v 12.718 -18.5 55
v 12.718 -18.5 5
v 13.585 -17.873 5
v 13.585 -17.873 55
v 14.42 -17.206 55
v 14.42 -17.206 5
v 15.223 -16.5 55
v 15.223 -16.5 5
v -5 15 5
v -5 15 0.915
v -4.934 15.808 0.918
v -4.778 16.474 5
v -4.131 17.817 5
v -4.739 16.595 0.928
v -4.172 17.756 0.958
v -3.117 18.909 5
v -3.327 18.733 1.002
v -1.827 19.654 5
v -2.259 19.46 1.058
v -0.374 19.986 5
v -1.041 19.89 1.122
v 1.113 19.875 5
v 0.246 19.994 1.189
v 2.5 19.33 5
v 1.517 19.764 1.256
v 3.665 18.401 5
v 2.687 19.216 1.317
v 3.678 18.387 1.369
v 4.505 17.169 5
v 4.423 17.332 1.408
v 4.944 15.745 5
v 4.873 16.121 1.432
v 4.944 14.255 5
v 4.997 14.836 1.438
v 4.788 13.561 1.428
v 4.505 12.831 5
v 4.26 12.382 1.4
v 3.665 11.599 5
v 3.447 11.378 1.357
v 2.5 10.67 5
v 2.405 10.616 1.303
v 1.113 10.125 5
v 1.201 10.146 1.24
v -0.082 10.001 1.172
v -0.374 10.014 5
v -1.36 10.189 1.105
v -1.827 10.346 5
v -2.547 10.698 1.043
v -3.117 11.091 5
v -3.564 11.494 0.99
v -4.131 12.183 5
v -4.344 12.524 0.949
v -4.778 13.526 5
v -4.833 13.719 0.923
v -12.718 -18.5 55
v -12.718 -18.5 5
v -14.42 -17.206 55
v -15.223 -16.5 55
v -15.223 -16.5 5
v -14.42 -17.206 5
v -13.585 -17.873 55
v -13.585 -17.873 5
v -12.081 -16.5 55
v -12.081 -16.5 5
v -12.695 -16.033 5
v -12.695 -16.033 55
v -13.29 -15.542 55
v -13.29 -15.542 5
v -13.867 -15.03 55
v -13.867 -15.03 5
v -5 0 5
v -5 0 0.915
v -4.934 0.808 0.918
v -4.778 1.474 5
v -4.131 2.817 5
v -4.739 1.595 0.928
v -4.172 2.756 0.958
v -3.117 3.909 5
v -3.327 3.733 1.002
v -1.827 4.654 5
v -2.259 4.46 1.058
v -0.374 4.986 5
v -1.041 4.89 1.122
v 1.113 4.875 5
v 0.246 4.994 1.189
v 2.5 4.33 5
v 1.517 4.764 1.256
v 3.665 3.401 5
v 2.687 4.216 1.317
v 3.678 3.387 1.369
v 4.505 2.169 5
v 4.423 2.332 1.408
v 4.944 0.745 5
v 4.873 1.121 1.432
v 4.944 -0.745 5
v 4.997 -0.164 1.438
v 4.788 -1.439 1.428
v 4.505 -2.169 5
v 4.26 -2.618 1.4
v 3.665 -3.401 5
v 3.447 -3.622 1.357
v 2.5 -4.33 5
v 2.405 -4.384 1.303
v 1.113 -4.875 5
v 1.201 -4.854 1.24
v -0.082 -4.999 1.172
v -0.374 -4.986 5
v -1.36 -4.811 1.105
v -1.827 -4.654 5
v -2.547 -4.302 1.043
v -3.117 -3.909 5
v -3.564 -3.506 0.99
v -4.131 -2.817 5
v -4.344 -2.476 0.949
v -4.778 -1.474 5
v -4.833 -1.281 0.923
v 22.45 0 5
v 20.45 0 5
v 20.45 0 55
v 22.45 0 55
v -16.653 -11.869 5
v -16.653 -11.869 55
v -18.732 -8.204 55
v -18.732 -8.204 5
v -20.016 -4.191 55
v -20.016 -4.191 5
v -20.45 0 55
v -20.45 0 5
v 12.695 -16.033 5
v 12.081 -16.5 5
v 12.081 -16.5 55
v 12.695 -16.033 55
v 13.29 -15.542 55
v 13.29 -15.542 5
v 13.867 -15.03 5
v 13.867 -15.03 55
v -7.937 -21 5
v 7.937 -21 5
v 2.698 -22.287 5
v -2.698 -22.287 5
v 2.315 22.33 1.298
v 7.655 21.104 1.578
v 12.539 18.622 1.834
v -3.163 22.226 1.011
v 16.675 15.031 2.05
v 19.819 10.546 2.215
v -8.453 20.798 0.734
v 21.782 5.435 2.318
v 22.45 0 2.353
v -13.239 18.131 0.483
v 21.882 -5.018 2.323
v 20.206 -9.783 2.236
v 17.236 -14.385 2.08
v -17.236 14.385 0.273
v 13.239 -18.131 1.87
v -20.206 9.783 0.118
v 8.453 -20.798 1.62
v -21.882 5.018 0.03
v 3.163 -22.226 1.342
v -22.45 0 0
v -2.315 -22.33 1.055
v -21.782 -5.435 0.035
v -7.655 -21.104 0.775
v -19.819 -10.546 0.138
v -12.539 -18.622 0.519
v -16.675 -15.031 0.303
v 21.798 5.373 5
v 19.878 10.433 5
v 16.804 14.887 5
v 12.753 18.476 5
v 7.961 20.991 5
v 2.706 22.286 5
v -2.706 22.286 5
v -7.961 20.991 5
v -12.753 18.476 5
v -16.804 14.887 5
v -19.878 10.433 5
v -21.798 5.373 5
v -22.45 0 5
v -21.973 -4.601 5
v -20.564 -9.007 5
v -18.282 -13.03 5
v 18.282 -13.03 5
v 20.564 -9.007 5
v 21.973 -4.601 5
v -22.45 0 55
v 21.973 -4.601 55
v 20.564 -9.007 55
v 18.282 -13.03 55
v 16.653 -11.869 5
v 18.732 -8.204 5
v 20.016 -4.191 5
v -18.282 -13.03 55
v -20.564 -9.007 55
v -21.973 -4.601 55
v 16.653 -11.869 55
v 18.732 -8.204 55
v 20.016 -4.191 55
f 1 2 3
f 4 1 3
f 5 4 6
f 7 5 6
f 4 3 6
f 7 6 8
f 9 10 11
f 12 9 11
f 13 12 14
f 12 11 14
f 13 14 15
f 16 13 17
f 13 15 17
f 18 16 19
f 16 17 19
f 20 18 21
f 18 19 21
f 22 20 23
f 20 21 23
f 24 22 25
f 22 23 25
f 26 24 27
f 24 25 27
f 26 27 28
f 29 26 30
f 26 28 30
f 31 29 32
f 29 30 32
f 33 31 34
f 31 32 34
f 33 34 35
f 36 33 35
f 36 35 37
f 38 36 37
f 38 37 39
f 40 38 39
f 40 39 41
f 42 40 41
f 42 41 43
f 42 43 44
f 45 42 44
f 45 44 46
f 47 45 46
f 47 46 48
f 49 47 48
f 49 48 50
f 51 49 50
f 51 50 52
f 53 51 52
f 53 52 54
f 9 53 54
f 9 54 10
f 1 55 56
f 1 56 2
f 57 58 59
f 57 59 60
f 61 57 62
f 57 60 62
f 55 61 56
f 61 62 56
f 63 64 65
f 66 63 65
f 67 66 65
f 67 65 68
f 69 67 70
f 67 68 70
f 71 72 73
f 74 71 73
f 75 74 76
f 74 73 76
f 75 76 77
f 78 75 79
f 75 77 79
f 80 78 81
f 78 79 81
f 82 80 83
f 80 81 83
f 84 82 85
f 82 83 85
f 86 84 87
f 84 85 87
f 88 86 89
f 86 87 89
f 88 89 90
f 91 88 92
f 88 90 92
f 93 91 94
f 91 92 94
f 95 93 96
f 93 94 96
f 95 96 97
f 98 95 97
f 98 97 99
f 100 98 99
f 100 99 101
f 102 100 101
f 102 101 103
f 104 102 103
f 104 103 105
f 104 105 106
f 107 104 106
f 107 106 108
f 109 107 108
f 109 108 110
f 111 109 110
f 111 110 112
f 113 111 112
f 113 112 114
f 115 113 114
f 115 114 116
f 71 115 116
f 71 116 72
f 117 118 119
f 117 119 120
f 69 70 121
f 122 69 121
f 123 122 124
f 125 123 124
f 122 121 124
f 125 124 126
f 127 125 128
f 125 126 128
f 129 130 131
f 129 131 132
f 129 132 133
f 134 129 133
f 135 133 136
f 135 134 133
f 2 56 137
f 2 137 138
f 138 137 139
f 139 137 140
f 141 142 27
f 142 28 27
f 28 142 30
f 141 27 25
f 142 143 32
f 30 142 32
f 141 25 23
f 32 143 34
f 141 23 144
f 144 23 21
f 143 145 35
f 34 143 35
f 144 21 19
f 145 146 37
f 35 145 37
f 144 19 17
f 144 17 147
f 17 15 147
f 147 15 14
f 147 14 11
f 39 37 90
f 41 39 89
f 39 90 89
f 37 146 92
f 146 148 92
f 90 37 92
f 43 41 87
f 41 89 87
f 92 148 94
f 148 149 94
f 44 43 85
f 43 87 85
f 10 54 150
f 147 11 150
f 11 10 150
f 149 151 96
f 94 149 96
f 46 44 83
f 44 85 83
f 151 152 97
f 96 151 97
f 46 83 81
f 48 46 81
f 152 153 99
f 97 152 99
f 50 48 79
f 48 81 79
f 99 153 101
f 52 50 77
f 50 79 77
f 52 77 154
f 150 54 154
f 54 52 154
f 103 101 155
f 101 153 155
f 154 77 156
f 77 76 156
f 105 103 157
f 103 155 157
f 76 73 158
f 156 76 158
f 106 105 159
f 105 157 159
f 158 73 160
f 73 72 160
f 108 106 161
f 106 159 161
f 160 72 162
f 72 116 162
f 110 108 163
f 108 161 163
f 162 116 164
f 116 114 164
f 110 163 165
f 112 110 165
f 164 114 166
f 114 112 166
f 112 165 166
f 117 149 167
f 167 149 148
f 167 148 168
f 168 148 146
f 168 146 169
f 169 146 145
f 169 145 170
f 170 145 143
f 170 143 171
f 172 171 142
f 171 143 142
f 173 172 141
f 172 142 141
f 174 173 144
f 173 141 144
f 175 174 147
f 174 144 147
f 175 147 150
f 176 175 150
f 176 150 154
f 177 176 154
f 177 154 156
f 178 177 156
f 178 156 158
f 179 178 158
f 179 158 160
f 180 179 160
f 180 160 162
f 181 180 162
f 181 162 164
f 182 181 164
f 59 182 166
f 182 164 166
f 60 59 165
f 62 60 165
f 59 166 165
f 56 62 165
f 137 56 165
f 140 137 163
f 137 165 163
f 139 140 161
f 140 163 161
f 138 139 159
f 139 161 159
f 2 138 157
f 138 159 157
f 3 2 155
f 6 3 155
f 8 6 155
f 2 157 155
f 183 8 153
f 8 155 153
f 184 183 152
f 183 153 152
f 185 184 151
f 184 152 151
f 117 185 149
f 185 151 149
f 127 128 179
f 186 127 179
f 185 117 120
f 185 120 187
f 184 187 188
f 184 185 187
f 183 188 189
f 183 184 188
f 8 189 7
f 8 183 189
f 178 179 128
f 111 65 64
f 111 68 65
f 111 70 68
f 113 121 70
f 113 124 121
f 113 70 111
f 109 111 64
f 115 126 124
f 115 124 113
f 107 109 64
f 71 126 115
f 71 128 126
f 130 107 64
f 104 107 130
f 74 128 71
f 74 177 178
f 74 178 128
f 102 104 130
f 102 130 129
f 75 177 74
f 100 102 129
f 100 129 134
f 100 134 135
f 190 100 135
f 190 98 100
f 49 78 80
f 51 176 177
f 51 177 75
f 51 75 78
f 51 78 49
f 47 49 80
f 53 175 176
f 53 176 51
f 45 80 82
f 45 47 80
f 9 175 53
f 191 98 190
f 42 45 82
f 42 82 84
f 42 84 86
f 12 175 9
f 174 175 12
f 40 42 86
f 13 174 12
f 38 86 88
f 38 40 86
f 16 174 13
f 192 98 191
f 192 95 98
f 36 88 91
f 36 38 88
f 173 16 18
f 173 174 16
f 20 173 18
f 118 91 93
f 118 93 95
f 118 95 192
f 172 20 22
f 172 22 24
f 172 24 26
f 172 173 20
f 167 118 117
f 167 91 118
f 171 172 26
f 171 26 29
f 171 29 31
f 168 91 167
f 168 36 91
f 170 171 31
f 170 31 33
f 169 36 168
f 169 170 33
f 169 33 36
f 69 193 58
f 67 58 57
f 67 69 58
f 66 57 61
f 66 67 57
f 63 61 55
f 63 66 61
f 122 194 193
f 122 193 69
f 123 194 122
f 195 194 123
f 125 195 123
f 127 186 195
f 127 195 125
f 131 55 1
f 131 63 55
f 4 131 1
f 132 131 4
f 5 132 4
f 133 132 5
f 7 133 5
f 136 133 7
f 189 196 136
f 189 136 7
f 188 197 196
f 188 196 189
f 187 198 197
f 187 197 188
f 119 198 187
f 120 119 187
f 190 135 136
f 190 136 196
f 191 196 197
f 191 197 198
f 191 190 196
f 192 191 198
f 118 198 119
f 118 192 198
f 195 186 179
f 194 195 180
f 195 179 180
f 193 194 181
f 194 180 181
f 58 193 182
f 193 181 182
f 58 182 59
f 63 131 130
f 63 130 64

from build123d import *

# Parameters (mm, degrees)
SKETCH1_R               = 22.45
BOSS_EXTRUDE1_DEPTH     = 5
SKETCH2_R               = 5
CUT_EXTRUDE1_DEPTH      = 5
BOSS_EXTRUDE2_DEPTH     = 50
BOSS_EXTRUDE5_DEPTH     = 50
CUT_EXTRUDE3_DEPTH      = 64.505944604
CUT_EXTRUDE3_DEPTH_BACK = 64.505944604


with BuildPart() as part:
    # Sketch1 → Boss-Extrude1 (new body)
    with BuildSketch(Plane.XY):
        Circle(SKETCH1_R)
    extrude(amount=BOSS_EXTRUDE1_DEPTH)

    # Sketch2 → Cut-Extrude1 (cut)
    with BuildSketch(Plane(origin=(0, 0, 0), x_dir=(-1, 0, 0), z_dir=(0, 0, -1))):
        Circle(SKETCH2_R)
        with Locations((0, 15)):
            Circle(SKETCH2_R)
    extrude(amount=-CUT_EXTRUDE1_DEPTH, mode=Mode.SUBTRACT)

    # Sketch3 → Boss-Extrude2 (add)
    with BuildSketch(Plane.XY.offset(5)):
        with BuildLine():
            Line((-12.718195627, -18.5), (12.718195627, -18.5))
            ThreePointArc((12.718195627, -18.5), (14.006550731, -17.544772344), (15.223419458, -16.5))
            Line((15.223419458, -16.5), (-15.223419458, -16.5))
            ThreePointArc((-15.223419458, -16.5), (-14.006550731, -17.544772344), (-12.718195627, -18.5))
        make_face()
    extrude(amount=BOSS_EXTRUDE2_DEPTH)

    # Sketch5 → Boss-Extrude5 (add)
    with BuildSketch(Plane.XY.offset(5)):
        with BuildLine():
            Line((-15.223419458, -16.5), (-12.08108025, -16.5))
            ThreePointArc((-12.08108025, -16.5), (-12.994947259, -15.790308602), (-13.867212825, -15.030066815))
            ThreePointArc((-13.867212825, -15.030066815), (-18.732151535, -8.204206169), (-20.45, 0))
            Line((-20.45, 0), (-22.45, 0))
            ThreePointArc((-22.45, 0), (-20.564146795, -9.006573521), (-15.223419458, -16.5))
        make_face()
        with BuildLine():
            Line((20.45, 0), (22.45, 0))
            ThreePointArc((22.45, 0), (20.564146795, -9.006573521), (15.223419458, -16.5))
            Line((15.223419458, -16.5), (12.08108025, -16.5))
            ThreePointArc((12.08108025, -16.5), (12.994947259, -15.790308602), (13.867212825, -15.030066815))
            ThreePointArc((13.867212825, -15.030066815), (18.732151535, -8.204206169), (20.45, 0))
        make_face()
    extrude(amount=BOSS_EXTRUDE5_DEPTH)

    # Sketch6 → Cut-Extrude3 (cut, two sides: drawn at the far end of the back side and taken through both)
    with BuildSketch(Plane(origin=(0, 0, 0), x_dir=(1, 0, 0), z_dir=(0, 1, 0)).offset(-CUT_EXTRUDE3_DEPTH_BACK)):
        Polygon((-22.45, 0), (22.45, 0), (22.45, -2.35310929), align=None)
    extrude(amount=CUT_EXTRUDE3_DEPTH + CUT_EXTRUDE3_DEPTH_BACK, mode=Mode.SUBTRACT)


solid = part.part
